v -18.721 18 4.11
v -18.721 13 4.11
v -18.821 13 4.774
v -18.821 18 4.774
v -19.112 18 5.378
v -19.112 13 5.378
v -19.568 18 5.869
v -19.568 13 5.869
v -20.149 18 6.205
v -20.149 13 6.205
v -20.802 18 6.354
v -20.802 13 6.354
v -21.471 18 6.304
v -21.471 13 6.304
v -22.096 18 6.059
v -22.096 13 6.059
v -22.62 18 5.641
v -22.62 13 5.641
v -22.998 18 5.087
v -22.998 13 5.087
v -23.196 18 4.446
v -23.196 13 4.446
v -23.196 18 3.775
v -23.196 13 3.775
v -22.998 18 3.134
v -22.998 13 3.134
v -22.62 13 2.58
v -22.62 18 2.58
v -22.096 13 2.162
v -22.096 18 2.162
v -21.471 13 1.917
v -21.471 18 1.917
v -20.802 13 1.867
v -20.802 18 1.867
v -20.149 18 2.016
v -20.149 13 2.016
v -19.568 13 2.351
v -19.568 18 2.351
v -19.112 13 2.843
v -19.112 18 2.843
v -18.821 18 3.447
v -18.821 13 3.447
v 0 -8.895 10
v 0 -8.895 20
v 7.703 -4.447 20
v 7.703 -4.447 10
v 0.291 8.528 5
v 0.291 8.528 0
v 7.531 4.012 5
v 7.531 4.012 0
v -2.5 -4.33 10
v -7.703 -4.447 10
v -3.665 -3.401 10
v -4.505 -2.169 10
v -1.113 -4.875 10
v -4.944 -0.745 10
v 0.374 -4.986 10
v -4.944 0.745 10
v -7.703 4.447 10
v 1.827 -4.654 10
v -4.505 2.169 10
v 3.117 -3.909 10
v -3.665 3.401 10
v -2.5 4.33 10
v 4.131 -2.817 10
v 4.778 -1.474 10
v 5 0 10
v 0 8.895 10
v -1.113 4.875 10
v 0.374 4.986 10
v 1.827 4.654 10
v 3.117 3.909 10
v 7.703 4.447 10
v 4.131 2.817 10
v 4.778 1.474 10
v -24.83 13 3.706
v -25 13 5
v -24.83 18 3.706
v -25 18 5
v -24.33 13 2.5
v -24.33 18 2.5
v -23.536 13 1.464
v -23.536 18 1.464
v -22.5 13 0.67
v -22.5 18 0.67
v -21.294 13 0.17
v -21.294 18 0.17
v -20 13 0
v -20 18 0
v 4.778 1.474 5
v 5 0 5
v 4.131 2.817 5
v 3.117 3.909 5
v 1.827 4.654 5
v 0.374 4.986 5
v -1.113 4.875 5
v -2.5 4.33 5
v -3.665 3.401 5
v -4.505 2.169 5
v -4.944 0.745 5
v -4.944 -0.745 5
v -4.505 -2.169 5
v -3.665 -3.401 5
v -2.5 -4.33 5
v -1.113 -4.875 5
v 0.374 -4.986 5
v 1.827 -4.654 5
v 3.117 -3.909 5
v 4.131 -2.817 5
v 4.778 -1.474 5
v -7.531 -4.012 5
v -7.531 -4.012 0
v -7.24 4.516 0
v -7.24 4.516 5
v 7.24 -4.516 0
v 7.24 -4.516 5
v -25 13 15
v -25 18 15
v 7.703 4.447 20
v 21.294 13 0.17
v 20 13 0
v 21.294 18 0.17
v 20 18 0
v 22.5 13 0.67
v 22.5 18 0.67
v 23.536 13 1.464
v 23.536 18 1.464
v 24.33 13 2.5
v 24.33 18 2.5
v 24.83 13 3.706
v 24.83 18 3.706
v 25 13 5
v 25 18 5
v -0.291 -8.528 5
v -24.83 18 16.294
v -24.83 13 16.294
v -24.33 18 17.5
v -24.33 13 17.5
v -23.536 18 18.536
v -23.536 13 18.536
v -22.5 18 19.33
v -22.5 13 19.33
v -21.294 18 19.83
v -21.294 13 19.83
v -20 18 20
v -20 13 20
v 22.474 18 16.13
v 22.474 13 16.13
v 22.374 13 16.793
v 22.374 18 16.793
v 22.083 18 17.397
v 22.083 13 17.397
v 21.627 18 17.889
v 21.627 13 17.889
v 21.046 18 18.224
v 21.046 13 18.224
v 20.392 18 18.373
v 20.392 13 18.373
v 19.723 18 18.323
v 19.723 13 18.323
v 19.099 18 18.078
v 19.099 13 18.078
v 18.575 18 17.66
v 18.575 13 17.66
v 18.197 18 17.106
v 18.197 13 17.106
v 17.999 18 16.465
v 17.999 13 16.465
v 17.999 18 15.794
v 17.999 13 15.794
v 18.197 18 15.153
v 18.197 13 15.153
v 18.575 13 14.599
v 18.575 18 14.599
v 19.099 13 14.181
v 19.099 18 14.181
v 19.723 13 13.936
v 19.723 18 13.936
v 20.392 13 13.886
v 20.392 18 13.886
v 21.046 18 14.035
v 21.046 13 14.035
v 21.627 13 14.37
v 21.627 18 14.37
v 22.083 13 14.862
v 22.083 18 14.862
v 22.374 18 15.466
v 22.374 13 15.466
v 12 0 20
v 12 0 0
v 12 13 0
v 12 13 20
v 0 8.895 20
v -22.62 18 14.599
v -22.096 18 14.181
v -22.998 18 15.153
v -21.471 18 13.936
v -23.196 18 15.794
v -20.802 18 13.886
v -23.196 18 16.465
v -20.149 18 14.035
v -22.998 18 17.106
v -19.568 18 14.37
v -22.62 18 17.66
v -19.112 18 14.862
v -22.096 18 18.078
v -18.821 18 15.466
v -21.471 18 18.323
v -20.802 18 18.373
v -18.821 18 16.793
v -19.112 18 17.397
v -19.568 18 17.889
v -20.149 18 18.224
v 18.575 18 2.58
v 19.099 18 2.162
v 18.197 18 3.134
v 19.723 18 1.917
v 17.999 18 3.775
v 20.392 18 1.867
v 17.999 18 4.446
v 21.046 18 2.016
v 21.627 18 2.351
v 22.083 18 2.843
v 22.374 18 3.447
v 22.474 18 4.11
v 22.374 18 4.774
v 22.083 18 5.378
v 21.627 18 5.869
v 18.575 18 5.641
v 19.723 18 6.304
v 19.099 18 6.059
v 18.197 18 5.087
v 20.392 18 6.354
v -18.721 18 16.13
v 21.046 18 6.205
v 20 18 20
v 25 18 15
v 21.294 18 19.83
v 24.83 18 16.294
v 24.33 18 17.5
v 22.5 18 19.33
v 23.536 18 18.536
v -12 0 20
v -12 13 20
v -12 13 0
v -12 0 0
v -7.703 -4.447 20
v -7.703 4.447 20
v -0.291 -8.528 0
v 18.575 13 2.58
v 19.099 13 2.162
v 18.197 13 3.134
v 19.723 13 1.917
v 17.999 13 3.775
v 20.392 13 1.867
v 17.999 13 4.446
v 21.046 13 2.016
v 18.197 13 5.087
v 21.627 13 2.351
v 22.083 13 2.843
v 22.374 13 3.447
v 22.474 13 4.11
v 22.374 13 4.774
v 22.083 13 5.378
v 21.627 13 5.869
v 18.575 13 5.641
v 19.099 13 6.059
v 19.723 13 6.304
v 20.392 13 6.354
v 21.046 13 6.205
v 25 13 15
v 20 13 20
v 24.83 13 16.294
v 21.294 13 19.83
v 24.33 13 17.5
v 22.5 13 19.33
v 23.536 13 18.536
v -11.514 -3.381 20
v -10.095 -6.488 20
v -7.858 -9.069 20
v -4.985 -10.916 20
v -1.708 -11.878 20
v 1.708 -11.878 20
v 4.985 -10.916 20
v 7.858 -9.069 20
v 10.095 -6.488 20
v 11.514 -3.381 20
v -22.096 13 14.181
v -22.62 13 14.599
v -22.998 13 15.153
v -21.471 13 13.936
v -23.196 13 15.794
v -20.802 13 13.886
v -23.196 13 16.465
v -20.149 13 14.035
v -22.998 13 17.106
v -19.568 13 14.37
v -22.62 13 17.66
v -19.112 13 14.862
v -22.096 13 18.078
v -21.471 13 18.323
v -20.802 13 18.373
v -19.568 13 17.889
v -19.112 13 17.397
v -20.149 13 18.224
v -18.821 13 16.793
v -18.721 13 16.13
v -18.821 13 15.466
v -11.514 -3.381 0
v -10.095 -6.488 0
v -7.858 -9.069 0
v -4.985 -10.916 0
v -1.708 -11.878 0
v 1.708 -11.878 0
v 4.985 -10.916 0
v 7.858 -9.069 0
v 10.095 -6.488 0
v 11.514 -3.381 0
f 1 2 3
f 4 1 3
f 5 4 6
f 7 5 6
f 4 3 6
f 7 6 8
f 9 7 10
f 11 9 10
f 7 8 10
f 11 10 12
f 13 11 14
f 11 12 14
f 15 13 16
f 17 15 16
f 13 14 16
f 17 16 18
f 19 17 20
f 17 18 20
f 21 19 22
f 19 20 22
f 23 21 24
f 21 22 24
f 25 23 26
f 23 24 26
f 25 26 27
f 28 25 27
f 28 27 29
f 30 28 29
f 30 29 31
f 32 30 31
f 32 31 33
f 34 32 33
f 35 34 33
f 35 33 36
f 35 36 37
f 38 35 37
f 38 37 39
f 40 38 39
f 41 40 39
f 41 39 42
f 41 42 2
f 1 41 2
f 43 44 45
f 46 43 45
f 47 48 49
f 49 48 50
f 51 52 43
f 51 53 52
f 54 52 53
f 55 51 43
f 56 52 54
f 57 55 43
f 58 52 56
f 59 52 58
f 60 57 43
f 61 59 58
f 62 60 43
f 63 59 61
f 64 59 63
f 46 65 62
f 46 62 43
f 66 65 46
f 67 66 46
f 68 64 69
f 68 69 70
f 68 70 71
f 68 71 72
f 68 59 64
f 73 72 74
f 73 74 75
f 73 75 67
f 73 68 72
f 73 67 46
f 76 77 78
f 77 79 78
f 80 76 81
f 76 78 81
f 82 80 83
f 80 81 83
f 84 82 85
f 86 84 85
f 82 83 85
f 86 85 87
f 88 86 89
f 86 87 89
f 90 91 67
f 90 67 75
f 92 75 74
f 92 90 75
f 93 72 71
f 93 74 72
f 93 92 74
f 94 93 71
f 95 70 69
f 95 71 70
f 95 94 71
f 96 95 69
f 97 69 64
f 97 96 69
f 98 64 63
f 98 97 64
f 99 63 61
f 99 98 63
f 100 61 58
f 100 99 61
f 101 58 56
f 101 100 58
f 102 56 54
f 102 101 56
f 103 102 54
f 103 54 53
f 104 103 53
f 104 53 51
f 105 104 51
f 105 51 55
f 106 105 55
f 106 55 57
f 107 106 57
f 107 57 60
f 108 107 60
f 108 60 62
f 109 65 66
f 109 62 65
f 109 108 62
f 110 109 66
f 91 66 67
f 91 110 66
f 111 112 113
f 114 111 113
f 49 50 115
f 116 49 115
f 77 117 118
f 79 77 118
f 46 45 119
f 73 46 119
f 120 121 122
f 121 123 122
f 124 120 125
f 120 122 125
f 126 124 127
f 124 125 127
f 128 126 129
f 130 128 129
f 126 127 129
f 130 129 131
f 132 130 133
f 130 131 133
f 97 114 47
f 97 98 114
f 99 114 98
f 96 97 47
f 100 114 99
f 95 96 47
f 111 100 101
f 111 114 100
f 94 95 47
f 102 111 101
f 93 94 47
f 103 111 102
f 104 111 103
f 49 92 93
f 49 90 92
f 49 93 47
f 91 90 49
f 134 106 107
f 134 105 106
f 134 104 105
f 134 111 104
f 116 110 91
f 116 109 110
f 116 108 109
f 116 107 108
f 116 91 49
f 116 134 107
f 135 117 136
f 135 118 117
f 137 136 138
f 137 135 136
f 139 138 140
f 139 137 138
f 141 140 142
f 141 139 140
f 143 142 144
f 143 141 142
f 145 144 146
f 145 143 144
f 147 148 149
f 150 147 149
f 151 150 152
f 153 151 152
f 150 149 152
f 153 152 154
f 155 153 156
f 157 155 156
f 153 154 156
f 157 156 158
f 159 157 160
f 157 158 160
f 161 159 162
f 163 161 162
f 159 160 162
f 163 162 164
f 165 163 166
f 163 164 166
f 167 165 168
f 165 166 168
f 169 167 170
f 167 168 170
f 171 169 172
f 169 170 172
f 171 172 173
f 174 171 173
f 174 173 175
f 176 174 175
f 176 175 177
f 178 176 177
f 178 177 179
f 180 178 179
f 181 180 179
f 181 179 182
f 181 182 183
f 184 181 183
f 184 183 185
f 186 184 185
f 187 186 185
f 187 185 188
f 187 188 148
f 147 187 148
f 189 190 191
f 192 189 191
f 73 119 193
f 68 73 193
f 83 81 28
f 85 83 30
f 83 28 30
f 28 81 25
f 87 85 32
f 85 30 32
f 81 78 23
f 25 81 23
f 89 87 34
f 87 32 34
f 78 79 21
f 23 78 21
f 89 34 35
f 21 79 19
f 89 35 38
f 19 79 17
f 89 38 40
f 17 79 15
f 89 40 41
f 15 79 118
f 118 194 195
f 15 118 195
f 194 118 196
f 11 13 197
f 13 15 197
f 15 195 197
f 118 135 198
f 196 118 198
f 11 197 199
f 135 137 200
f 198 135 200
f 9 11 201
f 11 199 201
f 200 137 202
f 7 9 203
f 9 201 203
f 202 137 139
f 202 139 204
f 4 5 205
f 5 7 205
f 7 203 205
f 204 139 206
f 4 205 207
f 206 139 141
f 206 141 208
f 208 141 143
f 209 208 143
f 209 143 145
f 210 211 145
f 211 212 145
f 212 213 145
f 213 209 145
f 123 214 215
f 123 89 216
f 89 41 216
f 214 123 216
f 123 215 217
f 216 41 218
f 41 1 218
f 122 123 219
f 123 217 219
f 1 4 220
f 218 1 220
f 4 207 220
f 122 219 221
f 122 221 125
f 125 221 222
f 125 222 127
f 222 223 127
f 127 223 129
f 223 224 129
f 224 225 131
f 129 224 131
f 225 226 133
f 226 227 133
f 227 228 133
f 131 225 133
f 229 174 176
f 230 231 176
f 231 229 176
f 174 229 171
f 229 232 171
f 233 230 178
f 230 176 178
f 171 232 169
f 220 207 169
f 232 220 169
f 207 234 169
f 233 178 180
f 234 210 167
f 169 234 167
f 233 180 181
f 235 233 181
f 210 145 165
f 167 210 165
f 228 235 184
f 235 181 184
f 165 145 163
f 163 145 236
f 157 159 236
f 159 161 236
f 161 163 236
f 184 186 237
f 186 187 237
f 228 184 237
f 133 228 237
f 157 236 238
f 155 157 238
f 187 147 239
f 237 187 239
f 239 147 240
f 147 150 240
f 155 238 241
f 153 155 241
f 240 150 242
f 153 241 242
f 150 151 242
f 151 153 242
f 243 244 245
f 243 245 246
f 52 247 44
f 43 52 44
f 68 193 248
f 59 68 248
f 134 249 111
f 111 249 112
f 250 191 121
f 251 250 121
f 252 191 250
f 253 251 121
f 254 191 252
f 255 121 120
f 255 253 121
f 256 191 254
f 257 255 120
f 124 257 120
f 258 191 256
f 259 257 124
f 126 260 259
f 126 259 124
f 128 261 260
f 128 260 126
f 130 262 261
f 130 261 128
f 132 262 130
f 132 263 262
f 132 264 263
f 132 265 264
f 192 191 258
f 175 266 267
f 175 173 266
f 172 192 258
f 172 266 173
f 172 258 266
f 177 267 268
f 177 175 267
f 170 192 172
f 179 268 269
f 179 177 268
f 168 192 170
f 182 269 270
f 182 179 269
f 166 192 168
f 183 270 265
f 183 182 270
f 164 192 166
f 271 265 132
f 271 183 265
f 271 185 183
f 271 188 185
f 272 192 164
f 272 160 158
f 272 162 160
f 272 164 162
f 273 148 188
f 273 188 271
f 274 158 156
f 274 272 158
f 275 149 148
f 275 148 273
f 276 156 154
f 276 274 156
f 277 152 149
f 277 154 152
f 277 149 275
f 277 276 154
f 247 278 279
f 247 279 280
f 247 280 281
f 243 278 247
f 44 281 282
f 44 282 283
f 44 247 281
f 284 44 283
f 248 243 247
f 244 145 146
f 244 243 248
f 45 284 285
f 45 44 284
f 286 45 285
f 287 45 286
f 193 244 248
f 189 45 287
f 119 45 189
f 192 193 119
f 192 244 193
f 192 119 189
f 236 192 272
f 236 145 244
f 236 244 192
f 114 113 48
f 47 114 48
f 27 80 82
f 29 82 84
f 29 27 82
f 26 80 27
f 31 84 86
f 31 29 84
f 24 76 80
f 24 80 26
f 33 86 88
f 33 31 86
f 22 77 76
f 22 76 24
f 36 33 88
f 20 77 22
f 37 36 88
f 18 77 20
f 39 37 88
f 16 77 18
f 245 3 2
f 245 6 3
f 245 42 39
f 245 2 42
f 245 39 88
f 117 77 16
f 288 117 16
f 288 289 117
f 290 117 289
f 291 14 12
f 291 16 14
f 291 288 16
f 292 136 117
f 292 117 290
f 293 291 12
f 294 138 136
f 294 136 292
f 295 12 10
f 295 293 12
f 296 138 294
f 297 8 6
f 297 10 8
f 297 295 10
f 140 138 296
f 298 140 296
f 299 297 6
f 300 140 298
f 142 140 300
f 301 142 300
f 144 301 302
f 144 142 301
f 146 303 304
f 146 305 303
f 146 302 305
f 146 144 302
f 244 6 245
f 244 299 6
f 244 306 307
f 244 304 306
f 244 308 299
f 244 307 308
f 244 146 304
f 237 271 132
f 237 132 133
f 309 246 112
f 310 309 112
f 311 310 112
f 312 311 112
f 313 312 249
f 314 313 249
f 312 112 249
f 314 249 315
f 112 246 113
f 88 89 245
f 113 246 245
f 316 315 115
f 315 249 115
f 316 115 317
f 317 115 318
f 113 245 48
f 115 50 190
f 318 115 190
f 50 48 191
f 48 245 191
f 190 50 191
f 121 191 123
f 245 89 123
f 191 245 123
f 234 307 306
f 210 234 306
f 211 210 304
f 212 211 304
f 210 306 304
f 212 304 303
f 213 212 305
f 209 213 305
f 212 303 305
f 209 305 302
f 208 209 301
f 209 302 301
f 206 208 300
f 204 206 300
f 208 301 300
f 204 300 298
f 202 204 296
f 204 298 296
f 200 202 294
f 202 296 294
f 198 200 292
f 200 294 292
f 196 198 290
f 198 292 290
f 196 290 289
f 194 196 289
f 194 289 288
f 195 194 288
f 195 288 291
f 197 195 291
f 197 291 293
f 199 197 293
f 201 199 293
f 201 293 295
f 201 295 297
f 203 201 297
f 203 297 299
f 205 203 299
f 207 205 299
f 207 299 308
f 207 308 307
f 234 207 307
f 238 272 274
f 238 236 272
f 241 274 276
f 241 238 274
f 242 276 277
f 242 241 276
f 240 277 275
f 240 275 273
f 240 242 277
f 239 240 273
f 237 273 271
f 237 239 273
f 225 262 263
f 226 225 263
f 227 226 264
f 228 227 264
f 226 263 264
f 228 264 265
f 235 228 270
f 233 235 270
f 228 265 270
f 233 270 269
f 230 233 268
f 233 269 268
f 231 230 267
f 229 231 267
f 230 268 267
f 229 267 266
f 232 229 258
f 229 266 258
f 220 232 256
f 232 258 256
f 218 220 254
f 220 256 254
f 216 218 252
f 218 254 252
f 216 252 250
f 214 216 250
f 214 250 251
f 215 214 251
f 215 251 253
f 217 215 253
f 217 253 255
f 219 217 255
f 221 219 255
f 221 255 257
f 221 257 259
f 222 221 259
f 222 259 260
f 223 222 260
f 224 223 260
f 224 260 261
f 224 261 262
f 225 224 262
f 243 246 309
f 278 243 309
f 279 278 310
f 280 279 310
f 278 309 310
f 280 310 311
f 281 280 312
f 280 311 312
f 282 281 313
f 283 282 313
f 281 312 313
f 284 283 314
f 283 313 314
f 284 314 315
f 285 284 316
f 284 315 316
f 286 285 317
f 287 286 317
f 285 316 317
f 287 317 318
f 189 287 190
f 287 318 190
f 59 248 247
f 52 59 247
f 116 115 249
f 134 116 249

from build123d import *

# Parameters (mm, degrees)
F0_R      = 5
F1_DEPTH  = 20
F2_W      = 50
F2_H      = 5
F3_DEPTH  = 20
F4_R      = 2.25
F5_DEPTH  = 25
F6_R      = 5
F8_DEPTH  = 10
F10_DEPTH = 5


with BuildPart() as f1:
    # F0 (on Top) → F1 (new body)
    with BuildSketch(Plane.XY):
        with BuildLine():
            Line((12, 18), (-12, 18))
            Line((-12, 18), (-12, 0))
            ThreePointArc((-12, 0), (0, -12), (12, 0))
            Line((12, 0), (12, 18))
        make_face()
        Circle(F0_R, mode=Mode.SUBTRACT)
    extrude(amount=F1_DEPTH)

    # F2 (on face) → F3 (join, through all)
    with BuildSketch(Plane.XY.offset(20)):
        with Locations((0, 15.5)):
            Rectangle(F2_W, F2_H)
    extrude(amount=-F3_DEPTH)

    # F4 (on face) → F5 (cut)
    with BuildSketch(Plane.XZ.offset(-13)):
        with Locations((-20.970641, 16.129617)):
            Circle(F4_R)
        with Locations((20.224099, 16.129617)):
            Circle(F4_R)
        with Locations((-20.970641, 4.11036)):
            Circle(F4_R)
        with Locations((20.224099, 4.11036)):
            Circle(F4_R)
    extrude(amount=-F5_DEPTH, mode=Mode.SUBTRACT)

    # F6
    f6_edges = [f1.edges().sort_by_distance(p)[0] for p in [
        (25, 15.5, 0),
        (-25, 15.5, 0),
        (-25, 15.5, 20),
        (25, 15.5, 20),
    ]]
    fillet(f6_edges, radius=F6_R)

    # F7 (on face) → F8 (cut)
    with BuildSketch(Plane.XY.offset(20)):
        Polygon((7.702981, 4.447318), (0, 8.894636), (-7.702981, 4.447318), (-7.702981, -4.447318), (0, -8.894636), (7.702981, -4.447318), align=None)
    extrude(amount=-F8_DEPTH, mode=Mode.SUBTRACT)

    # F9 (on face) → F10 (cut)
    with BuildSketch(Plane(origin=(0, 0, 0), x_dir=(1, 0, 0), z_dir=(0, 0, -1))):
        Polygon((-0.291229, 8.527634), (-7.530763, 4.011605), (-7.239533, -4.516029), (0.291229, -8.527634), (7.530763, -4.011605), (7.239533, 4.516029), align=None)
    extrude(amount=-F10_DEPTH, mode=Mode.SUBTRACT)


solid = f1.part
